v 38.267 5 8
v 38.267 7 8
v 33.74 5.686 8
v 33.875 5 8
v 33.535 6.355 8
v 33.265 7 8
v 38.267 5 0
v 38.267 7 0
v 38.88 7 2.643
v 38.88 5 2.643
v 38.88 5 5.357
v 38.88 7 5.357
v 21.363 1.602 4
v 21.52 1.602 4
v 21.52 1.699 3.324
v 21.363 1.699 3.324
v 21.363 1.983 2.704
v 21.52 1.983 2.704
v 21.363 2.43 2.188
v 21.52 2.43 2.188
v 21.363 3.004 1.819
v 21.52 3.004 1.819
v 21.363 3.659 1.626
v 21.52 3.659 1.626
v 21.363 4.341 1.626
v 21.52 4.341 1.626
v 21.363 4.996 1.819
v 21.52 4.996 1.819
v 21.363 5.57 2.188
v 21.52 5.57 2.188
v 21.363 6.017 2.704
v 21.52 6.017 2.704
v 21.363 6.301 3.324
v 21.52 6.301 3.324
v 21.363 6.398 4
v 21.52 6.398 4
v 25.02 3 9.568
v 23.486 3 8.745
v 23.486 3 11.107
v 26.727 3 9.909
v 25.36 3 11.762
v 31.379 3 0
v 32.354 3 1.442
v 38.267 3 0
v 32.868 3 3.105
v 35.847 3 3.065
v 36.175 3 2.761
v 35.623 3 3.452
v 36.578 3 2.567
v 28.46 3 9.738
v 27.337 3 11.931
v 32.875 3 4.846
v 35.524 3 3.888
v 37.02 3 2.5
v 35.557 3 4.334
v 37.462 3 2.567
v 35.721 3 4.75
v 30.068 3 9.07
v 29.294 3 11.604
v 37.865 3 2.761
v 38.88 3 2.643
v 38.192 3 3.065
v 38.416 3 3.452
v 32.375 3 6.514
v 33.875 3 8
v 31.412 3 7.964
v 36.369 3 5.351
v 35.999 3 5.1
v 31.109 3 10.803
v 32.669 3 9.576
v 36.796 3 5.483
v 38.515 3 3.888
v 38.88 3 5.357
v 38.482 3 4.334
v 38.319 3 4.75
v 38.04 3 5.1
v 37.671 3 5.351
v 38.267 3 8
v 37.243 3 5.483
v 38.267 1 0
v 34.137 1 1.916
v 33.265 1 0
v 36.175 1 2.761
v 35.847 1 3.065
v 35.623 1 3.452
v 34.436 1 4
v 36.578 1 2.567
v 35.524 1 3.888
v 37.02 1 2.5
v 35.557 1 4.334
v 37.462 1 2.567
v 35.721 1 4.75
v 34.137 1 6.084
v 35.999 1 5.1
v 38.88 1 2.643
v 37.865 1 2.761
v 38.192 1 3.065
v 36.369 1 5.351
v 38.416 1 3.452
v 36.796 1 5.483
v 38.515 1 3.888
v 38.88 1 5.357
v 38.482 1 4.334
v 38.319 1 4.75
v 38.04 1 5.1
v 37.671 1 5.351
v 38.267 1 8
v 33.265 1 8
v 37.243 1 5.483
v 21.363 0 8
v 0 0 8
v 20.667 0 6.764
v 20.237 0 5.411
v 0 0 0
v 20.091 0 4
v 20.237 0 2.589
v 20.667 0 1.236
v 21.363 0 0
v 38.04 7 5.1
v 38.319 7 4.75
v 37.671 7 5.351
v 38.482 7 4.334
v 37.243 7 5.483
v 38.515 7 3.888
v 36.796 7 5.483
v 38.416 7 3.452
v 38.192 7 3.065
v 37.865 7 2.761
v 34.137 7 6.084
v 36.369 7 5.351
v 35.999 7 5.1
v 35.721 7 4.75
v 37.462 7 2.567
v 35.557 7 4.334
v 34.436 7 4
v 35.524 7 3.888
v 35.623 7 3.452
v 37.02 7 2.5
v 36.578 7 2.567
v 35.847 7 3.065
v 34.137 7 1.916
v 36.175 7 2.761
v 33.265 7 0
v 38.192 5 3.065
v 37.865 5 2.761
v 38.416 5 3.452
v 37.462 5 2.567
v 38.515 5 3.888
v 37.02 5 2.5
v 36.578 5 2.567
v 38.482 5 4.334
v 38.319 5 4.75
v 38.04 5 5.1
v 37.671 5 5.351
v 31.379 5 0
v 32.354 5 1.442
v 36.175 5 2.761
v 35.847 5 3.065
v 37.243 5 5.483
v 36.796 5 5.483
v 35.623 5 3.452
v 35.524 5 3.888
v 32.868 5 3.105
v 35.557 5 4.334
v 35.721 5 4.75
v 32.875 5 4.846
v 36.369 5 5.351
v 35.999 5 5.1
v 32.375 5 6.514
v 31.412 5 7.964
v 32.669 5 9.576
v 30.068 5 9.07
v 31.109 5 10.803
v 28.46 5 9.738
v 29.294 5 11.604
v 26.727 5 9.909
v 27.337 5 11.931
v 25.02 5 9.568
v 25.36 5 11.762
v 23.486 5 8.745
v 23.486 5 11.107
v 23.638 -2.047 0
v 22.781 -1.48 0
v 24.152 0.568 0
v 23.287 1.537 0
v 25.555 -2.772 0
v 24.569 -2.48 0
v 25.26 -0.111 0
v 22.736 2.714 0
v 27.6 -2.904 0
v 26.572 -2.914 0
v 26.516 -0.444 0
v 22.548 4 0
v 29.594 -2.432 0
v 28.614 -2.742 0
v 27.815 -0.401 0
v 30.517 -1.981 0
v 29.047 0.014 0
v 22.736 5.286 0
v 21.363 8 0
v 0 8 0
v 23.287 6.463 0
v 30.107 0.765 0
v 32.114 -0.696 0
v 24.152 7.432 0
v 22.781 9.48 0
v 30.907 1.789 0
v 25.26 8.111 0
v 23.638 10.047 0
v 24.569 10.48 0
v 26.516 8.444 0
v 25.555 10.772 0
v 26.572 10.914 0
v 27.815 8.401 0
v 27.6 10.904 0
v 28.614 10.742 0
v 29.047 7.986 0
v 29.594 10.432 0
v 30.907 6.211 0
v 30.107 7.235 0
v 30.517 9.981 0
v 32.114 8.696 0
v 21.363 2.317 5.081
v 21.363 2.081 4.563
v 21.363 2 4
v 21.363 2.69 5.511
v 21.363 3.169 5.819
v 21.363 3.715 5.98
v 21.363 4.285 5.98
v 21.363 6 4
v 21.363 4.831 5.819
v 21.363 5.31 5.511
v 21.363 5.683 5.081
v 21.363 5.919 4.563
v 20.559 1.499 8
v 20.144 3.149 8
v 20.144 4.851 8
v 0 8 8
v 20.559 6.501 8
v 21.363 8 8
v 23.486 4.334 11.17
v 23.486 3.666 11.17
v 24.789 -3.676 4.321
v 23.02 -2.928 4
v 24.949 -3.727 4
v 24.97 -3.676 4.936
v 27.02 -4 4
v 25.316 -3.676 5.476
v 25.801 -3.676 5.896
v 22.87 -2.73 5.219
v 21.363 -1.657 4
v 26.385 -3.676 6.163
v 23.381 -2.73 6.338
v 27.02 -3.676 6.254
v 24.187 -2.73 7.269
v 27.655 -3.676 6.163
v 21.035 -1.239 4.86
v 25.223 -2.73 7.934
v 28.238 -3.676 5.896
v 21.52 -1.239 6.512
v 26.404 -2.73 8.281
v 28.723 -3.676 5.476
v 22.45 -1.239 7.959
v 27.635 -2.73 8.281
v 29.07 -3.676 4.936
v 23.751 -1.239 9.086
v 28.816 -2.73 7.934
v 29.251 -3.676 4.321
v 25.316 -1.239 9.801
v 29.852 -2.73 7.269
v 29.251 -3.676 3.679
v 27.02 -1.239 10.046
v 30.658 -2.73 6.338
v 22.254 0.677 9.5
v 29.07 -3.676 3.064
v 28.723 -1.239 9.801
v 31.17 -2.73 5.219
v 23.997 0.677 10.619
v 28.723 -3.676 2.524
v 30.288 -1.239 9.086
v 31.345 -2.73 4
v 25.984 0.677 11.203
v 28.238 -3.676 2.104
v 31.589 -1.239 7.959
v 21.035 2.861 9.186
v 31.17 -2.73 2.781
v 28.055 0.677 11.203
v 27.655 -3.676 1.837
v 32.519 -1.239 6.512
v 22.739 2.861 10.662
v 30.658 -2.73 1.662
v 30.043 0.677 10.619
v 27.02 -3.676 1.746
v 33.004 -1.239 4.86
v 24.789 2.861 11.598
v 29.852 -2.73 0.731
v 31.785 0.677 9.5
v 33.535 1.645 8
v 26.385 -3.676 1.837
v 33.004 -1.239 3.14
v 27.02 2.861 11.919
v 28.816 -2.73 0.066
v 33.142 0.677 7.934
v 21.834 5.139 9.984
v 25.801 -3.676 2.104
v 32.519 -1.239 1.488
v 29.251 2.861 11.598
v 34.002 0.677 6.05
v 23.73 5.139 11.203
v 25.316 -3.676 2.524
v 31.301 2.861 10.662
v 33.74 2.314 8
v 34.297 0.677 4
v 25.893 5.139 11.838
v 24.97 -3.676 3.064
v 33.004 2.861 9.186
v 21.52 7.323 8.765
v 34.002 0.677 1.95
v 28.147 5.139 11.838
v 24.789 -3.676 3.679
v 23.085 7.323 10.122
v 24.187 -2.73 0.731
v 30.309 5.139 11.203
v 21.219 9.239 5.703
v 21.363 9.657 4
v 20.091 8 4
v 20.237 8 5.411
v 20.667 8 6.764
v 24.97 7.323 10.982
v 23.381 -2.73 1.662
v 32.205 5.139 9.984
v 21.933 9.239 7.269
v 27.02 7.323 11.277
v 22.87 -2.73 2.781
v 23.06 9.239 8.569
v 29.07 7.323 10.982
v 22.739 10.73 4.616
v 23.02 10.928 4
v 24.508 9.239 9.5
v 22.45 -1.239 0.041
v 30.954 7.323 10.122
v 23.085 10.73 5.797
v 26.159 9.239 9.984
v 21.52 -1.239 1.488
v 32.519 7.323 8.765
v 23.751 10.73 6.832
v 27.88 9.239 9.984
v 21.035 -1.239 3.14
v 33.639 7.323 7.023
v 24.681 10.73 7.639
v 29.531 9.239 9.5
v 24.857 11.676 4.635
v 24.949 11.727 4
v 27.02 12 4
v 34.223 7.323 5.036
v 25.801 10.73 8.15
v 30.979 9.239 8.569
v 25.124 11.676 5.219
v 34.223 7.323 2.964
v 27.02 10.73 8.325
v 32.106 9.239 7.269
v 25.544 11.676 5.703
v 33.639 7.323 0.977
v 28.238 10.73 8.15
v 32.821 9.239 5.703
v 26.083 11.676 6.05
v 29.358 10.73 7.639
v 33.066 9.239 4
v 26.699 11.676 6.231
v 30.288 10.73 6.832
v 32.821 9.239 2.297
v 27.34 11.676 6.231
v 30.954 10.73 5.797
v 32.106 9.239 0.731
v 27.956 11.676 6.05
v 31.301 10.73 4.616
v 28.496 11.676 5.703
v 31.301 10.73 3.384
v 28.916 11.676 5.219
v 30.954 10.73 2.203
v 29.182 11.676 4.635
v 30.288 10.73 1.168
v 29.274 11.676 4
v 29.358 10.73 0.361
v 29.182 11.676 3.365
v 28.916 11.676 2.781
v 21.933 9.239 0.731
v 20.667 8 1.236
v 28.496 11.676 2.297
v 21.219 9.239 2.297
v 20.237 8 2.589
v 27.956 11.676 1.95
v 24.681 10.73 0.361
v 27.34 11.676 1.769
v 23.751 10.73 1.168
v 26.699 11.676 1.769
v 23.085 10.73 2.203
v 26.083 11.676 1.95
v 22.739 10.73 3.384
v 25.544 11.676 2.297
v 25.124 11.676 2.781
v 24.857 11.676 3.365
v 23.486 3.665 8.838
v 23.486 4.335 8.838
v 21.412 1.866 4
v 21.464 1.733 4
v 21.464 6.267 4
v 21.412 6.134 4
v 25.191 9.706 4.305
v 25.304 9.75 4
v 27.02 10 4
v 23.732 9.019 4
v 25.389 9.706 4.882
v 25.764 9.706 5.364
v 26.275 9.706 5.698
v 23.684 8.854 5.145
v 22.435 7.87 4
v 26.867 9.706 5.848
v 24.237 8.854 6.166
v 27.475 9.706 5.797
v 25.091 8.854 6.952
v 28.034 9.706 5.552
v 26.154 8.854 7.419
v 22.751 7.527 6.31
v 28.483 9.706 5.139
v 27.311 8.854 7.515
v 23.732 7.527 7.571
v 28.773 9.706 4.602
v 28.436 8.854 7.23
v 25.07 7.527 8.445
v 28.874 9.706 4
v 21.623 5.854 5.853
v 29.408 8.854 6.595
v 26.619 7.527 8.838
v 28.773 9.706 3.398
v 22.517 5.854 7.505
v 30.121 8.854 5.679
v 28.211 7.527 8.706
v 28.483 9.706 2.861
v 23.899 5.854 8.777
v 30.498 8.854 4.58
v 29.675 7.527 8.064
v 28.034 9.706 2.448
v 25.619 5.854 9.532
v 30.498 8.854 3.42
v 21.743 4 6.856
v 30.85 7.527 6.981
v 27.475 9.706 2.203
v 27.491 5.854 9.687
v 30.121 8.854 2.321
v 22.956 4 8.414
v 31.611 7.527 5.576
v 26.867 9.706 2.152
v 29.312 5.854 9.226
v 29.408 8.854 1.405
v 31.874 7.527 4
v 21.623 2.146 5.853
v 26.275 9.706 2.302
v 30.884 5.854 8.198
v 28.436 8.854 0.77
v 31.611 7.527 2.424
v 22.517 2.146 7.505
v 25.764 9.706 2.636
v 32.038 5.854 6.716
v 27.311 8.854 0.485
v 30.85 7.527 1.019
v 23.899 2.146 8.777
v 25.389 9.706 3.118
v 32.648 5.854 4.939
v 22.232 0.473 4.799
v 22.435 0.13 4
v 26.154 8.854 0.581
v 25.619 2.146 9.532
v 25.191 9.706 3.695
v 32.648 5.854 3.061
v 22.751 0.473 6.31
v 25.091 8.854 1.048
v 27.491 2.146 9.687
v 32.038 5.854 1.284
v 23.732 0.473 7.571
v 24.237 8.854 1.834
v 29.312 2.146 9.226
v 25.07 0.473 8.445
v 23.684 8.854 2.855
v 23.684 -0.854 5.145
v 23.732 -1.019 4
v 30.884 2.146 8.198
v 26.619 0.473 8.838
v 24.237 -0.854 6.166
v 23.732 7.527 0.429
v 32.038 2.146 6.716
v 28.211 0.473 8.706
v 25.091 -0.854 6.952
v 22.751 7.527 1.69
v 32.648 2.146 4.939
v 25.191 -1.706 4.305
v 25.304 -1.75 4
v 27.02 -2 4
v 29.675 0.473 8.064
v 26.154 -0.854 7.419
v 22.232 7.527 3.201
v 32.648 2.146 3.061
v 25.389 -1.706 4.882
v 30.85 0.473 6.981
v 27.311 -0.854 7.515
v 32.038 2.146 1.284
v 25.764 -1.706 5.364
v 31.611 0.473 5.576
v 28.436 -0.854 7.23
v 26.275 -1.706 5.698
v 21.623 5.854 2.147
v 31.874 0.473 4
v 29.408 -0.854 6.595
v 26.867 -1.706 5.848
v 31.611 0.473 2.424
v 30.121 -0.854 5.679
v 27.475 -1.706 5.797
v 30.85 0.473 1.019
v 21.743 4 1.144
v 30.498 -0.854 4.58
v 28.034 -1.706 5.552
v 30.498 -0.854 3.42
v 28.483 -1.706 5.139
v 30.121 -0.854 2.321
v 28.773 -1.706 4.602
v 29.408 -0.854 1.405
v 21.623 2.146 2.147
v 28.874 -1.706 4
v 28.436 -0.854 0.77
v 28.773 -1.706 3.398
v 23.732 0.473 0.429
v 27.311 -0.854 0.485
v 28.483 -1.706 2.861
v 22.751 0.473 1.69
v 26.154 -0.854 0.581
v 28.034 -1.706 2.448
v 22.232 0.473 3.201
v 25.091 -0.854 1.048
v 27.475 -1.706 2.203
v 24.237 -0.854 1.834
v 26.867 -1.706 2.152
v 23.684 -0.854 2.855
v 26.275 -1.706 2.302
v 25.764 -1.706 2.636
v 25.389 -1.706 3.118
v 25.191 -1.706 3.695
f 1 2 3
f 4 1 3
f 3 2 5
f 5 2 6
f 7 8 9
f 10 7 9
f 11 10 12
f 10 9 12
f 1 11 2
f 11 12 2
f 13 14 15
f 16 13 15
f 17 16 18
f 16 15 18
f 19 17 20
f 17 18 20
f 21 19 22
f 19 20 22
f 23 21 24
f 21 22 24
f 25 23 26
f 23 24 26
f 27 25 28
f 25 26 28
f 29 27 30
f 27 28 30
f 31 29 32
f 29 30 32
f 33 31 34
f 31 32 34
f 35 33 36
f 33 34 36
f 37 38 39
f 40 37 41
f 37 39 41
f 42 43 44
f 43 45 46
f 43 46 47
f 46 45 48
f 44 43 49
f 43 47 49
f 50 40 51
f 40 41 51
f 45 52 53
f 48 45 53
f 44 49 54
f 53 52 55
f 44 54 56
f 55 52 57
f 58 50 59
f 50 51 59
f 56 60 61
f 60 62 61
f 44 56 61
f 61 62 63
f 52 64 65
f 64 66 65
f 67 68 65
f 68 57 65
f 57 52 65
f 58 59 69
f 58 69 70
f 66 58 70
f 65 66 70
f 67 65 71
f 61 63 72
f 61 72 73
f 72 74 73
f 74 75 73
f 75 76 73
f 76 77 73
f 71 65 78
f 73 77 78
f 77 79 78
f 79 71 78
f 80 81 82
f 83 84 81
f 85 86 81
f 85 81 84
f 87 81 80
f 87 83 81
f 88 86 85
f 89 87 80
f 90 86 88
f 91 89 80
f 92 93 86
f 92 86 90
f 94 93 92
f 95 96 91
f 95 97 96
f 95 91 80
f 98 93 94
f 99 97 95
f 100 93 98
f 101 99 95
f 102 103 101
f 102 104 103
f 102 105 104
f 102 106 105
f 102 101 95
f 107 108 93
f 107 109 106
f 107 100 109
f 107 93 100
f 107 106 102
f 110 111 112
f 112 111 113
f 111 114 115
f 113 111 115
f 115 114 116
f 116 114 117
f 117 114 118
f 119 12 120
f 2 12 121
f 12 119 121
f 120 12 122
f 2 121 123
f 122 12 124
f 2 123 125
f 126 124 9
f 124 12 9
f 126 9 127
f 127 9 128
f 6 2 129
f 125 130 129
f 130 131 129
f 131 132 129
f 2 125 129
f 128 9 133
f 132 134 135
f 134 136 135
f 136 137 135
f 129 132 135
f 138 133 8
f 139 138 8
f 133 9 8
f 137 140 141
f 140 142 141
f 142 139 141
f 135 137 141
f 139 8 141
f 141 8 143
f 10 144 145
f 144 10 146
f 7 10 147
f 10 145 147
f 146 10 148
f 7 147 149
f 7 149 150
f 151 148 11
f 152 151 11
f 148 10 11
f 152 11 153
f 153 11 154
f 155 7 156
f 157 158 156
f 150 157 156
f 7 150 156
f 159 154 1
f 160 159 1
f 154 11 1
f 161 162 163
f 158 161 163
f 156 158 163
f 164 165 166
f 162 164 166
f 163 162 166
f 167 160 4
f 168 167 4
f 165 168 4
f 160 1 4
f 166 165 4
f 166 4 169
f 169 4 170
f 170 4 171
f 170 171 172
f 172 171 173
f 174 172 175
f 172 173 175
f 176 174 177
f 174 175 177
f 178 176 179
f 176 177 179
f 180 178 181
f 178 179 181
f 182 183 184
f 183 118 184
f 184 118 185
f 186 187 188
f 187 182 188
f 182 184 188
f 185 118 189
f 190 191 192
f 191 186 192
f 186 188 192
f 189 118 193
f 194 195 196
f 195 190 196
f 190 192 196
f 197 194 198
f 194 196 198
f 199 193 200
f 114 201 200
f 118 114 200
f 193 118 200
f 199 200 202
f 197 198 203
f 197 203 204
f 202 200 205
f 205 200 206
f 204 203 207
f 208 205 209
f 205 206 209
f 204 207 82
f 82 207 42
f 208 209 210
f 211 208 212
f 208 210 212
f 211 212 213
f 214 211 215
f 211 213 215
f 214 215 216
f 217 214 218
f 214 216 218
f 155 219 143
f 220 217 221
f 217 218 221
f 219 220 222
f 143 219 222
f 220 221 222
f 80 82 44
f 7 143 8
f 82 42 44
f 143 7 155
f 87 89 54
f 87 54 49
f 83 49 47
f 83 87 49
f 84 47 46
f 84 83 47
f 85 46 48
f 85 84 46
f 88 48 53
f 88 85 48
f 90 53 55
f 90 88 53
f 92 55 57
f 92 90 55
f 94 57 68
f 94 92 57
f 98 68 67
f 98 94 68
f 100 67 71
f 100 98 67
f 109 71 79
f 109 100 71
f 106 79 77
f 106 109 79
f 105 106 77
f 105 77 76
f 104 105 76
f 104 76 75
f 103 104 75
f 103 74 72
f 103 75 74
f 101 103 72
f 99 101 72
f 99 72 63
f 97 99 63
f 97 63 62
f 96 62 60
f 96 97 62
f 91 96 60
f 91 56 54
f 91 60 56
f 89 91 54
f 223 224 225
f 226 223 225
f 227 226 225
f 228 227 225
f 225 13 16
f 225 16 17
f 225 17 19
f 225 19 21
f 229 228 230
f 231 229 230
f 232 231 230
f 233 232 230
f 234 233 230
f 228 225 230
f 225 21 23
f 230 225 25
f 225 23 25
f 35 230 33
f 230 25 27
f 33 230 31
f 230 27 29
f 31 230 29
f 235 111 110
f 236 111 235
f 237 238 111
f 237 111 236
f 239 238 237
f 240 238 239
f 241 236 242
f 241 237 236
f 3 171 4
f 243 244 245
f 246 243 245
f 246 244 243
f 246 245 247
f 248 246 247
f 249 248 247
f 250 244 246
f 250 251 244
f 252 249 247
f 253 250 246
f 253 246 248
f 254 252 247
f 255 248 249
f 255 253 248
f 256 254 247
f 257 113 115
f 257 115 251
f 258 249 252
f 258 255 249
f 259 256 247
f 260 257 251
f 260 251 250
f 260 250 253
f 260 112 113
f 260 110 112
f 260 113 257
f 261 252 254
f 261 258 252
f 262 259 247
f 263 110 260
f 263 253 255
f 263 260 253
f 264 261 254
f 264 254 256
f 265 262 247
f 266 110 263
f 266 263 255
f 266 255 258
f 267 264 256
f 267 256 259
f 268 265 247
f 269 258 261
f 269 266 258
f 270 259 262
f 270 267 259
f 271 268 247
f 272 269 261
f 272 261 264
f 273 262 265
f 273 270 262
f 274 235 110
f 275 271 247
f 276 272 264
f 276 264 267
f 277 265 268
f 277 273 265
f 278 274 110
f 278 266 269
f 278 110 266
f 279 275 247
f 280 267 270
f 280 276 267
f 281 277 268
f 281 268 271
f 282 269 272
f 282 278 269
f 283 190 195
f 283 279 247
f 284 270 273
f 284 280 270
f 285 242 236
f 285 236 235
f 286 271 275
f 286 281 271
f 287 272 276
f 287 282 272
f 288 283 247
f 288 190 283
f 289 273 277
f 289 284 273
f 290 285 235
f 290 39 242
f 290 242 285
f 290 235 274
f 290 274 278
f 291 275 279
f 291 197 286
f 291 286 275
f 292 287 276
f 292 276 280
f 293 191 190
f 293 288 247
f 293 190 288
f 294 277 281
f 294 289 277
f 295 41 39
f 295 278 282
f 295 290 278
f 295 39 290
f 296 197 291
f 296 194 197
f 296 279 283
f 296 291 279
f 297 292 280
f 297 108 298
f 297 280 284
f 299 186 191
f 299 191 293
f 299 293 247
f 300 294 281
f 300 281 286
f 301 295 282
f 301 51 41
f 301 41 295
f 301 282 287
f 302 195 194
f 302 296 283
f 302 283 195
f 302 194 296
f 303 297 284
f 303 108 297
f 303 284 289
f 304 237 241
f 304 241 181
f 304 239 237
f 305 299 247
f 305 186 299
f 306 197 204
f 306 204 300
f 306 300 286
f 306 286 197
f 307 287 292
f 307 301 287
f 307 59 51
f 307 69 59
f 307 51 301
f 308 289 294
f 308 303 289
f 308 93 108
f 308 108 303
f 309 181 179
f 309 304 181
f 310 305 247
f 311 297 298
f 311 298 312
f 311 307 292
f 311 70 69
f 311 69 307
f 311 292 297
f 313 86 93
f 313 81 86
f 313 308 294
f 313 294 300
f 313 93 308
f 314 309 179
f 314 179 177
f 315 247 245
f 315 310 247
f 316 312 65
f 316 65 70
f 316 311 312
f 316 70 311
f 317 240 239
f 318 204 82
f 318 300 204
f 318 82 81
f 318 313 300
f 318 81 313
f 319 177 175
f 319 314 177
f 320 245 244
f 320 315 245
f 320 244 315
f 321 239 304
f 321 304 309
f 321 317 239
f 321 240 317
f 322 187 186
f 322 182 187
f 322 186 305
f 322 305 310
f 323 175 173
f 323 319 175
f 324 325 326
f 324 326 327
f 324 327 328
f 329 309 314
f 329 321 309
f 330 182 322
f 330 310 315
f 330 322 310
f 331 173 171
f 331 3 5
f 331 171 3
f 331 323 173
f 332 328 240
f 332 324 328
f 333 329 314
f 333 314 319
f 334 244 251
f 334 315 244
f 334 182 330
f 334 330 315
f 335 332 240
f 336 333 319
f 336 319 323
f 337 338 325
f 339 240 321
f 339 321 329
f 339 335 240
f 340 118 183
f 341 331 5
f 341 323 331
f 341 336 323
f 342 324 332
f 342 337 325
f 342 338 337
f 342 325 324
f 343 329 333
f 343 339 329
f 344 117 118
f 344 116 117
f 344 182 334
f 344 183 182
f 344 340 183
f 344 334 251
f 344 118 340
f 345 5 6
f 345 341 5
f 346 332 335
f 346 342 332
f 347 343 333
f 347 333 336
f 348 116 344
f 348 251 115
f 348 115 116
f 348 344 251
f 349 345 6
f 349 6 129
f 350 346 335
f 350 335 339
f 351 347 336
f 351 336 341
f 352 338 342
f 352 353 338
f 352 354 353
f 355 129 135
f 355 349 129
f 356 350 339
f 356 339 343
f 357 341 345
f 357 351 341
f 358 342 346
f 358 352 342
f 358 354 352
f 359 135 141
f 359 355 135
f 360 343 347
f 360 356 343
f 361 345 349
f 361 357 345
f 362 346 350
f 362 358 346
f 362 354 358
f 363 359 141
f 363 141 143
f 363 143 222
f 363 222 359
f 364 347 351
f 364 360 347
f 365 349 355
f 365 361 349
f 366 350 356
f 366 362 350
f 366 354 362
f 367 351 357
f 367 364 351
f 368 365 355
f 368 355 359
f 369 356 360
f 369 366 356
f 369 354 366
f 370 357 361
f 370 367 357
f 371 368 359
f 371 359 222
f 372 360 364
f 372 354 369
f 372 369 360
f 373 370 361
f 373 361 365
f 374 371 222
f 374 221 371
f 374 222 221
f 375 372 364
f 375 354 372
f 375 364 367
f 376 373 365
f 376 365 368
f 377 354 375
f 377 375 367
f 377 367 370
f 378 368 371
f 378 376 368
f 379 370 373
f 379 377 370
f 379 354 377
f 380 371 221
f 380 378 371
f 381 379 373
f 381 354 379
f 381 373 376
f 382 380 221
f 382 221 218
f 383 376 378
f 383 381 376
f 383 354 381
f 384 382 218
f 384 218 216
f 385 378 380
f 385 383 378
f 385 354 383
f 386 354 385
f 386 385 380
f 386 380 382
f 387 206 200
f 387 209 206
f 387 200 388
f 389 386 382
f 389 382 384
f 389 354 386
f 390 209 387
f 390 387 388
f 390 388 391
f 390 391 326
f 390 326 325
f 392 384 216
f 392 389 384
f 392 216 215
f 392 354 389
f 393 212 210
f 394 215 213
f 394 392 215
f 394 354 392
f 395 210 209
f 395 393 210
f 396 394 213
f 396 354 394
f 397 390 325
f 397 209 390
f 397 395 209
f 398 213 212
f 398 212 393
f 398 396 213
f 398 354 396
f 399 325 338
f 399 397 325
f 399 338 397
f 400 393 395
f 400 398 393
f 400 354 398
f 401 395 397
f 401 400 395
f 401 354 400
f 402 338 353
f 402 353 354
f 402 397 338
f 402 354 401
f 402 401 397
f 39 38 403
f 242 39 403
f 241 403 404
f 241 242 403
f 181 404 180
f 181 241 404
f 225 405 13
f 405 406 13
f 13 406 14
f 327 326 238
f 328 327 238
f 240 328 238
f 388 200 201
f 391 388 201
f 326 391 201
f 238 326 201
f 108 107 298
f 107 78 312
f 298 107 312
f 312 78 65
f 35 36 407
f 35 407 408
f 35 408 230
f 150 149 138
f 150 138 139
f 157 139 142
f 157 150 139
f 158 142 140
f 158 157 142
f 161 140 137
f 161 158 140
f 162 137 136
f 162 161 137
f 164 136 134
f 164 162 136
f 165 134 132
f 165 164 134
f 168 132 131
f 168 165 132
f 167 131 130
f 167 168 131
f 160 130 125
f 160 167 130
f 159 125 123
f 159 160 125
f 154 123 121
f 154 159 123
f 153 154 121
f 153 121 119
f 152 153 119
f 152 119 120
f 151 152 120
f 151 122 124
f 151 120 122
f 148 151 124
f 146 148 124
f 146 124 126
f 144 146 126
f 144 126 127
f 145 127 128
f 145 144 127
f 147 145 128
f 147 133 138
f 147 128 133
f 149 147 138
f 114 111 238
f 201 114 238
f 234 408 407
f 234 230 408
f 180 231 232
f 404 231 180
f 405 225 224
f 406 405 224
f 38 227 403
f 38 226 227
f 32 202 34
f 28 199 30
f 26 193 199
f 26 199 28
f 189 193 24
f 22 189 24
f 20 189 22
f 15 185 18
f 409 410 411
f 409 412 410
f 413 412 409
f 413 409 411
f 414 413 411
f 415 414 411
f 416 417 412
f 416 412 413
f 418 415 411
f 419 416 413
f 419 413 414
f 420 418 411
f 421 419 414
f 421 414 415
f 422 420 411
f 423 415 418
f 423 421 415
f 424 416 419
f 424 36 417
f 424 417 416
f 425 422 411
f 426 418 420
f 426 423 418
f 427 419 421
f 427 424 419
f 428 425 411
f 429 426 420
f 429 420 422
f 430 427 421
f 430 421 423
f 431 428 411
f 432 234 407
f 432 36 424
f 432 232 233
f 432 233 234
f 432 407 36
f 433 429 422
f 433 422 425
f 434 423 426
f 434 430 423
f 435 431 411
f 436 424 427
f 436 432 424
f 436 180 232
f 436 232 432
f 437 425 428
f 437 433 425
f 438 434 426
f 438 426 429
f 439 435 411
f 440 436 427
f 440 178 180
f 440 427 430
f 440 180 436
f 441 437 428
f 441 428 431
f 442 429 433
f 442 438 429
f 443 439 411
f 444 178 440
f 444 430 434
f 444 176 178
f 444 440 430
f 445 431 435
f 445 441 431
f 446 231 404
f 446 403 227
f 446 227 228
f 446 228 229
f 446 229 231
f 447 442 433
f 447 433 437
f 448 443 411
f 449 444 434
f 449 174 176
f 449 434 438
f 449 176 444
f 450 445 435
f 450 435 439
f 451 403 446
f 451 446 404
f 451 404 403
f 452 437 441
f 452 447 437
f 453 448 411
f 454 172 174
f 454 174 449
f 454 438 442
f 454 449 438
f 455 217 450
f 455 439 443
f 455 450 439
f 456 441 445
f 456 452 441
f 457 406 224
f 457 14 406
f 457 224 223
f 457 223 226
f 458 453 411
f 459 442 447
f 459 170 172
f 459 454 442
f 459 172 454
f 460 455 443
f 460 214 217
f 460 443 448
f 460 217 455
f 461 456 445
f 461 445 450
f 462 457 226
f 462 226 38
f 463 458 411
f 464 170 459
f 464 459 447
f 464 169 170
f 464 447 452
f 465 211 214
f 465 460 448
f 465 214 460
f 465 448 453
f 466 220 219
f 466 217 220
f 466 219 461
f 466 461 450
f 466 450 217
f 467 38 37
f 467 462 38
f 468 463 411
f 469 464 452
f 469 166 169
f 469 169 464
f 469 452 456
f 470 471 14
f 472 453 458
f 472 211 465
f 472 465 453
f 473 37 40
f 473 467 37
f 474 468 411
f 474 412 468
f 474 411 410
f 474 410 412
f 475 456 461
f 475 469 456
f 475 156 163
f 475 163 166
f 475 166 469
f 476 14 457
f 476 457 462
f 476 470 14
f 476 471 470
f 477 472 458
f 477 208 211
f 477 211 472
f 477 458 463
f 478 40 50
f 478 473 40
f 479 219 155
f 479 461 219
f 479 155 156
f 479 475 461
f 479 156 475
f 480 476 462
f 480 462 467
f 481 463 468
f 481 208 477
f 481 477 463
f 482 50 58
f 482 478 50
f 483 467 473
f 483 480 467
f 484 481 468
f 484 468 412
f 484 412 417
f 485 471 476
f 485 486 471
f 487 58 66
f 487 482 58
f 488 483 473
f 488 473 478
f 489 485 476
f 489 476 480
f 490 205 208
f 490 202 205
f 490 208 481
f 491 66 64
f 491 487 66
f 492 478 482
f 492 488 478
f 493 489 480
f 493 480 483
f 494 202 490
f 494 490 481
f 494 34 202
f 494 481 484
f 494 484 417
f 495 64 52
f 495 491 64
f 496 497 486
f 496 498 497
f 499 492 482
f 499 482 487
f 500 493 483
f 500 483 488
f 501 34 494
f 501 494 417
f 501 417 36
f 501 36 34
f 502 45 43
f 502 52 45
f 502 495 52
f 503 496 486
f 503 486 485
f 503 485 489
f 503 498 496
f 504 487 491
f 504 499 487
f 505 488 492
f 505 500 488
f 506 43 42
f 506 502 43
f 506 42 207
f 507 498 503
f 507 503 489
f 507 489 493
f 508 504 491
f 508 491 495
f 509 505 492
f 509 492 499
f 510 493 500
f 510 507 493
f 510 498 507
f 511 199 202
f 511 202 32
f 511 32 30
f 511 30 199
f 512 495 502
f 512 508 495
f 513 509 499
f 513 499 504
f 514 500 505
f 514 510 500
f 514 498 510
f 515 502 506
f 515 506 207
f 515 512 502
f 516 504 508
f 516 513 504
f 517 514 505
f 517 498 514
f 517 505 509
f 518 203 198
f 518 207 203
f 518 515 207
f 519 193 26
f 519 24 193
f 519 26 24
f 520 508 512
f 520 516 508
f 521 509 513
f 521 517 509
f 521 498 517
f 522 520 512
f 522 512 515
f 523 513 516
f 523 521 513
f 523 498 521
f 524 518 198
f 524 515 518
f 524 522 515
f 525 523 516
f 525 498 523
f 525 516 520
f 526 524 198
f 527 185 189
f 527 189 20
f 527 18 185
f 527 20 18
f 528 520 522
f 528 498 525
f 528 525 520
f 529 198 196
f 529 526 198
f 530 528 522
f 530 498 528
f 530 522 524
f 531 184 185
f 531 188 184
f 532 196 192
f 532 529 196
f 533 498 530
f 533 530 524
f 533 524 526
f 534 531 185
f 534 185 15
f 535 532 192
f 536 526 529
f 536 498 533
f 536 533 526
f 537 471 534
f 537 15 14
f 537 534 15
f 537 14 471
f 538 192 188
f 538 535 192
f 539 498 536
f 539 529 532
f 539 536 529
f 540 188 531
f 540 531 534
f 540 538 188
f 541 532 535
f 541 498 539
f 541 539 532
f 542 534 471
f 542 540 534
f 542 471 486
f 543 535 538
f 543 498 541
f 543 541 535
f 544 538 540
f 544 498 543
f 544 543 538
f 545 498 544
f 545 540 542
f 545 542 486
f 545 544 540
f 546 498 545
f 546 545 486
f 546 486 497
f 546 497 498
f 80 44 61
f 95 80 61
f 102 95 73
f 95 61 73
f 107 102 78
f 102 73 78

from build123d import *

# Parameters (mm, degrees)
RESSALTO_EXTRUS_O1_DEPTH    = 4
ESBO_O33_W                  = 8
ESBO_O33_H                  = 24.32835801
CORTE_EXTRUS_O20_DEPTH      = 59.436005136
CORTE_EXTRUS_O22_DEPTH      = 51.515563889
RESSALTO_EXTRUS_O14_DEPTH   = 4
ESBO_O38_R                  = 7
CORTE_EXTRUS_O23_DEPTH      = 39.915014679
ESBO_O39_W                  = 29.519685428
ESBO_O39_H                  = 8
CORTE_EXTRUS_O24_DEPTH      = 38.873187976
CORTE_EXTRUS_O25_DEPTH      = 39.915014679
CORTE_EXTRUS_O25_DEPTH_BACK = 39.915014679
ESBO_O40_W                  = 11.533486782
ESBO_O40_H                  = 2
CORTE_EXTRUS_O26_DEPTH      = 0.156854249
RESSALTO_EXTRUS_O15_START   = -1
RESSALTO_EXTRUS_O15_DEPTH   = 2
RESSALTO_EXTRUS_O16_START   = 2
RESSALTO_EXTRUS_O16_DEPTH   = 2
CORTE_EXTRUS_O27_DEPTH      = 43.203568046
CORTE_EXTRUS_O27_DEPTH_BACK = 43.203568046
ESBO_O44_R                  = 1.5


with BuildPart() as part:
    # Esboço1 → Ressalto-extrusão1 (new body)
    with BuildSketch(Plane.XY):
        with BuildLine():
            Line((40.514368641, 0), (48.514368641, 0))
            ThreePointArc((48.514368641, 0), (39.227067694, 12.823953684), (24.146045917, 8))
            Line((24.146045917, 8), (-21.519685428, 8))
            Line((-21.519685428, 8), (-21.519685428, 32.32835801))
            Line((-21.519685428, 32.32835801), (-29.519685428, 32.32835801))
            Line((-29.519685428, 32.32835801), (-29.519685428, 0))
            Line((-29.519685428, 0), (29.519685428, 0))
            ThreePointArc((29.519685428, 0), (35.017027034, 5.497341607), (40.514368641, 0))
        make_face()
    extrude(amount=RESSALTO_EXTRUS_O1_DEPTH)

    # Esboço33 → Corte-extrusão20 (cut, through all)
    with BuildSketch(Plane.XY.offset(4)):
        with Locations((-25.519685428, 20.164179005)):
            Rectangle(ESBO_O33_W, ESBO_O33_H)
    extrude(amount=-CORTE_EXTRUS_O20_DEPTH, mode=Mode.SUBTRACT)

    # Esboço34 → Corte-extrusão22 (cut, through all)
    with BuildSketch(Plane.XY.offset(4)):
        with BuildLine():
            Line((21.519685428, 0), (21.519685428, 8))
            Line((21.519685428, 8), (24.146045917, 8))
            ThreePointArc((24.146045917, 8), (39.227067694, 12.823953684), (48.514368641, 0))
            Line((48.514368641, 0), (40.514368641, 0))
            ThreePointArc((40.514368641, 0), (35.017027034, 5.497341607), (29.519685428, 0))
            Line((29.519685428, 0), (21.519685428, 0))
        make_face()
    extrude(amount=-CORTE_EXTRUS_O22_DEPTH, mode=Mode.SUBTRACT)

    # Esboço36 → Revolução1 (revolve)
    with BuildSketch(Plane.XY.offset(4)):
        with BuildLine():
            Line((27.019685428, -2), (27.019685428, -4))
            ThreePointArc((27.019685428, -4), (19.019685428, 4), (27.019685428, 12))
            Line((27.019685428, 12), (27.019685428, 10))
            ThreePointArc((27.019685428, 10), (21.019685428, 4), (27.019685428, -2))
        make_face()
    revolve(axis=Axis((27.019685428, -2, 4), (0, 1, 0)))

    # Esboço37 → Ressalto-extrusão14 (add)
    with BuildSketch(Plane.XY.offset(4)):
        with BuildLine():
            ThreePointArc((21.362831178, 8), (20.091482197, 4), (21.362831178, 0))
            Line((21.362831178, 0), (21.362831178, 8))
        make_face()
        with BuildLine():
            Line((20.091482197, 0), (21.362831178, 0))
            ThreePointArc((21.362831178, 0), (20.091482197, 4), (21.362831178, 8))
            Line((21.362831178, 8), (20.091482197, 8))
            Line((20.091482197, 8), (-29.519685428, 8))
            Line((-29.519685428, 8), (-29.519685428, 0))
            Line((-29.519685428, 0), (20.091482197, 0))
        make_face()
    extrude(amount=RESSALTO_EXTRUS_O14_DEPTH)

    # Esboço38 → Corte-extrusão23 (cut, through all)
    with BuildSketch(Plane(origin=(0, 0, 0), x_dir=(-1, 0, 0), z_dir=(0, 0, -1))):
        with Locations((-27.019685428, 4)):
            Circle(ESBO_O38_R)
    extrude(amount=CORTE_EXTRUS_O23_DEPTH, mode=Mode.SUBTRACT)

    # Esboço39 → Corte-extrusão24 (cut, through all)
    with BuildSketch(Plane.XY.offset(8)):
        with Locations((-14.759842714, 4)):
            Rectangle(ESBO_O39_W, ESBO_O39_H)
    extrude(amount=-CORTE_EXTRUS_O24_DEPTH, mode=Mode.SUBTRACT)

    # Esboço40 → Corte-extrusão25 (cut, two sides: drawn at the far end of the back side and taken through both)
    with BuildSketch(Plane(origin=(0, 0, 0), x_dir=(-1, 0, 0), z_dir=(0, 0, -1)).offset(-CORTE_EXTRUS_O25_DEPTH_BACK)):
        with Locations((-29.252942037, 4)):
            Rectangle(ESBO_O40_W, ESBO_O40_H)
    extrude(amount=CORTE_EXTRUS_O25_DEPTH + CORTE_EXTRUS_O25_DEPTH_BACK, mode=Mode.SUBTRACT)

    # Esboço41 → Corte-extrusão26 (cut)
    with BuildSketch(Plane(origin=(21.519685428, 0, 0), x_dir=(0, 0, -1), z_dir=(1, 0, 0))):
        with BuildLine():
            Line((-4, 6.397915762), (-4, 1.602084238))
            ThreePointArc((-4, 1.602084238), (-1.602084238, 4), (-4, 6.397915762))
        make_face()
    extrude(amount=-CORTE_EXTRUS_O26_DEPTH, mode=Mode.SUBTRACT)

    # Esboço42 → Ressalto-extrusão15 (add)
    with BuildSketch(Plane(origin=(0, 8, 0), x_dir=(1, 0, 0), z_dir=(0, 1, 0)).offset(RESSALTO_EXTRUS_O15_START)):
        with BuildLine():
            Line((32.597781304, 0), (38.266819794, 0))
            ThreePointArc((38.266819794, 0), (38.956939361, -4), (38.266819794, -8))
            Line((38.266819794, -8), (32.597781304, -8))
            ThreePointArc((32.597781304, -8), (33.88373333, -4), (32.597781304, 0))
        make_face()
    extrude(amount=-RESSALTO_EXTRUS_O15_DEPTH)

    # Esboço43 → Ressalto-extrusão16 (add)
    with BuildSketch(Plane.XZ.offset(-5).offset(RESSALTO_EXTRUS_O16_START)):
        with BuildLine():
            Line((38.266819794, 8), (33.264683426, 8))
            ThreePointArc((33.264683426, 8), (34.435883915, 4), (33.264683426, 0))
            Line((33.264683426, 0), (38.266819794, 0))
            ThreePointArc((38.266819794, 0), (38.956939361, 4), (38.266819794, 8))
        make_face()
    extrude(amount=RESSALTO_EXTRUS_O16_DEPTH)

    # Esboço44 → Corte-extrusão27 (cut, two sides: drawn at the far end of the back side and taken through both)
    with BuildSketch(Plane(origin=(0, 7, 0), x_dir=(1, 0, 0), z_dir=(0, 1, 0)).offset(-CORTE_EXTRUS_O27_DEPTH_BACK)):
        with Locations(Location((37.019685428, -4, 0), (0, 0, 90))):
            Circle(ESBO_O44_R)
    extrude(amount=CORTE_EXTRUS_O27_DEPTH + CORTE_EXTRUS_O27_DEPTH_BACK, mode=Mode.SUBTRACT)


solid = part.part
